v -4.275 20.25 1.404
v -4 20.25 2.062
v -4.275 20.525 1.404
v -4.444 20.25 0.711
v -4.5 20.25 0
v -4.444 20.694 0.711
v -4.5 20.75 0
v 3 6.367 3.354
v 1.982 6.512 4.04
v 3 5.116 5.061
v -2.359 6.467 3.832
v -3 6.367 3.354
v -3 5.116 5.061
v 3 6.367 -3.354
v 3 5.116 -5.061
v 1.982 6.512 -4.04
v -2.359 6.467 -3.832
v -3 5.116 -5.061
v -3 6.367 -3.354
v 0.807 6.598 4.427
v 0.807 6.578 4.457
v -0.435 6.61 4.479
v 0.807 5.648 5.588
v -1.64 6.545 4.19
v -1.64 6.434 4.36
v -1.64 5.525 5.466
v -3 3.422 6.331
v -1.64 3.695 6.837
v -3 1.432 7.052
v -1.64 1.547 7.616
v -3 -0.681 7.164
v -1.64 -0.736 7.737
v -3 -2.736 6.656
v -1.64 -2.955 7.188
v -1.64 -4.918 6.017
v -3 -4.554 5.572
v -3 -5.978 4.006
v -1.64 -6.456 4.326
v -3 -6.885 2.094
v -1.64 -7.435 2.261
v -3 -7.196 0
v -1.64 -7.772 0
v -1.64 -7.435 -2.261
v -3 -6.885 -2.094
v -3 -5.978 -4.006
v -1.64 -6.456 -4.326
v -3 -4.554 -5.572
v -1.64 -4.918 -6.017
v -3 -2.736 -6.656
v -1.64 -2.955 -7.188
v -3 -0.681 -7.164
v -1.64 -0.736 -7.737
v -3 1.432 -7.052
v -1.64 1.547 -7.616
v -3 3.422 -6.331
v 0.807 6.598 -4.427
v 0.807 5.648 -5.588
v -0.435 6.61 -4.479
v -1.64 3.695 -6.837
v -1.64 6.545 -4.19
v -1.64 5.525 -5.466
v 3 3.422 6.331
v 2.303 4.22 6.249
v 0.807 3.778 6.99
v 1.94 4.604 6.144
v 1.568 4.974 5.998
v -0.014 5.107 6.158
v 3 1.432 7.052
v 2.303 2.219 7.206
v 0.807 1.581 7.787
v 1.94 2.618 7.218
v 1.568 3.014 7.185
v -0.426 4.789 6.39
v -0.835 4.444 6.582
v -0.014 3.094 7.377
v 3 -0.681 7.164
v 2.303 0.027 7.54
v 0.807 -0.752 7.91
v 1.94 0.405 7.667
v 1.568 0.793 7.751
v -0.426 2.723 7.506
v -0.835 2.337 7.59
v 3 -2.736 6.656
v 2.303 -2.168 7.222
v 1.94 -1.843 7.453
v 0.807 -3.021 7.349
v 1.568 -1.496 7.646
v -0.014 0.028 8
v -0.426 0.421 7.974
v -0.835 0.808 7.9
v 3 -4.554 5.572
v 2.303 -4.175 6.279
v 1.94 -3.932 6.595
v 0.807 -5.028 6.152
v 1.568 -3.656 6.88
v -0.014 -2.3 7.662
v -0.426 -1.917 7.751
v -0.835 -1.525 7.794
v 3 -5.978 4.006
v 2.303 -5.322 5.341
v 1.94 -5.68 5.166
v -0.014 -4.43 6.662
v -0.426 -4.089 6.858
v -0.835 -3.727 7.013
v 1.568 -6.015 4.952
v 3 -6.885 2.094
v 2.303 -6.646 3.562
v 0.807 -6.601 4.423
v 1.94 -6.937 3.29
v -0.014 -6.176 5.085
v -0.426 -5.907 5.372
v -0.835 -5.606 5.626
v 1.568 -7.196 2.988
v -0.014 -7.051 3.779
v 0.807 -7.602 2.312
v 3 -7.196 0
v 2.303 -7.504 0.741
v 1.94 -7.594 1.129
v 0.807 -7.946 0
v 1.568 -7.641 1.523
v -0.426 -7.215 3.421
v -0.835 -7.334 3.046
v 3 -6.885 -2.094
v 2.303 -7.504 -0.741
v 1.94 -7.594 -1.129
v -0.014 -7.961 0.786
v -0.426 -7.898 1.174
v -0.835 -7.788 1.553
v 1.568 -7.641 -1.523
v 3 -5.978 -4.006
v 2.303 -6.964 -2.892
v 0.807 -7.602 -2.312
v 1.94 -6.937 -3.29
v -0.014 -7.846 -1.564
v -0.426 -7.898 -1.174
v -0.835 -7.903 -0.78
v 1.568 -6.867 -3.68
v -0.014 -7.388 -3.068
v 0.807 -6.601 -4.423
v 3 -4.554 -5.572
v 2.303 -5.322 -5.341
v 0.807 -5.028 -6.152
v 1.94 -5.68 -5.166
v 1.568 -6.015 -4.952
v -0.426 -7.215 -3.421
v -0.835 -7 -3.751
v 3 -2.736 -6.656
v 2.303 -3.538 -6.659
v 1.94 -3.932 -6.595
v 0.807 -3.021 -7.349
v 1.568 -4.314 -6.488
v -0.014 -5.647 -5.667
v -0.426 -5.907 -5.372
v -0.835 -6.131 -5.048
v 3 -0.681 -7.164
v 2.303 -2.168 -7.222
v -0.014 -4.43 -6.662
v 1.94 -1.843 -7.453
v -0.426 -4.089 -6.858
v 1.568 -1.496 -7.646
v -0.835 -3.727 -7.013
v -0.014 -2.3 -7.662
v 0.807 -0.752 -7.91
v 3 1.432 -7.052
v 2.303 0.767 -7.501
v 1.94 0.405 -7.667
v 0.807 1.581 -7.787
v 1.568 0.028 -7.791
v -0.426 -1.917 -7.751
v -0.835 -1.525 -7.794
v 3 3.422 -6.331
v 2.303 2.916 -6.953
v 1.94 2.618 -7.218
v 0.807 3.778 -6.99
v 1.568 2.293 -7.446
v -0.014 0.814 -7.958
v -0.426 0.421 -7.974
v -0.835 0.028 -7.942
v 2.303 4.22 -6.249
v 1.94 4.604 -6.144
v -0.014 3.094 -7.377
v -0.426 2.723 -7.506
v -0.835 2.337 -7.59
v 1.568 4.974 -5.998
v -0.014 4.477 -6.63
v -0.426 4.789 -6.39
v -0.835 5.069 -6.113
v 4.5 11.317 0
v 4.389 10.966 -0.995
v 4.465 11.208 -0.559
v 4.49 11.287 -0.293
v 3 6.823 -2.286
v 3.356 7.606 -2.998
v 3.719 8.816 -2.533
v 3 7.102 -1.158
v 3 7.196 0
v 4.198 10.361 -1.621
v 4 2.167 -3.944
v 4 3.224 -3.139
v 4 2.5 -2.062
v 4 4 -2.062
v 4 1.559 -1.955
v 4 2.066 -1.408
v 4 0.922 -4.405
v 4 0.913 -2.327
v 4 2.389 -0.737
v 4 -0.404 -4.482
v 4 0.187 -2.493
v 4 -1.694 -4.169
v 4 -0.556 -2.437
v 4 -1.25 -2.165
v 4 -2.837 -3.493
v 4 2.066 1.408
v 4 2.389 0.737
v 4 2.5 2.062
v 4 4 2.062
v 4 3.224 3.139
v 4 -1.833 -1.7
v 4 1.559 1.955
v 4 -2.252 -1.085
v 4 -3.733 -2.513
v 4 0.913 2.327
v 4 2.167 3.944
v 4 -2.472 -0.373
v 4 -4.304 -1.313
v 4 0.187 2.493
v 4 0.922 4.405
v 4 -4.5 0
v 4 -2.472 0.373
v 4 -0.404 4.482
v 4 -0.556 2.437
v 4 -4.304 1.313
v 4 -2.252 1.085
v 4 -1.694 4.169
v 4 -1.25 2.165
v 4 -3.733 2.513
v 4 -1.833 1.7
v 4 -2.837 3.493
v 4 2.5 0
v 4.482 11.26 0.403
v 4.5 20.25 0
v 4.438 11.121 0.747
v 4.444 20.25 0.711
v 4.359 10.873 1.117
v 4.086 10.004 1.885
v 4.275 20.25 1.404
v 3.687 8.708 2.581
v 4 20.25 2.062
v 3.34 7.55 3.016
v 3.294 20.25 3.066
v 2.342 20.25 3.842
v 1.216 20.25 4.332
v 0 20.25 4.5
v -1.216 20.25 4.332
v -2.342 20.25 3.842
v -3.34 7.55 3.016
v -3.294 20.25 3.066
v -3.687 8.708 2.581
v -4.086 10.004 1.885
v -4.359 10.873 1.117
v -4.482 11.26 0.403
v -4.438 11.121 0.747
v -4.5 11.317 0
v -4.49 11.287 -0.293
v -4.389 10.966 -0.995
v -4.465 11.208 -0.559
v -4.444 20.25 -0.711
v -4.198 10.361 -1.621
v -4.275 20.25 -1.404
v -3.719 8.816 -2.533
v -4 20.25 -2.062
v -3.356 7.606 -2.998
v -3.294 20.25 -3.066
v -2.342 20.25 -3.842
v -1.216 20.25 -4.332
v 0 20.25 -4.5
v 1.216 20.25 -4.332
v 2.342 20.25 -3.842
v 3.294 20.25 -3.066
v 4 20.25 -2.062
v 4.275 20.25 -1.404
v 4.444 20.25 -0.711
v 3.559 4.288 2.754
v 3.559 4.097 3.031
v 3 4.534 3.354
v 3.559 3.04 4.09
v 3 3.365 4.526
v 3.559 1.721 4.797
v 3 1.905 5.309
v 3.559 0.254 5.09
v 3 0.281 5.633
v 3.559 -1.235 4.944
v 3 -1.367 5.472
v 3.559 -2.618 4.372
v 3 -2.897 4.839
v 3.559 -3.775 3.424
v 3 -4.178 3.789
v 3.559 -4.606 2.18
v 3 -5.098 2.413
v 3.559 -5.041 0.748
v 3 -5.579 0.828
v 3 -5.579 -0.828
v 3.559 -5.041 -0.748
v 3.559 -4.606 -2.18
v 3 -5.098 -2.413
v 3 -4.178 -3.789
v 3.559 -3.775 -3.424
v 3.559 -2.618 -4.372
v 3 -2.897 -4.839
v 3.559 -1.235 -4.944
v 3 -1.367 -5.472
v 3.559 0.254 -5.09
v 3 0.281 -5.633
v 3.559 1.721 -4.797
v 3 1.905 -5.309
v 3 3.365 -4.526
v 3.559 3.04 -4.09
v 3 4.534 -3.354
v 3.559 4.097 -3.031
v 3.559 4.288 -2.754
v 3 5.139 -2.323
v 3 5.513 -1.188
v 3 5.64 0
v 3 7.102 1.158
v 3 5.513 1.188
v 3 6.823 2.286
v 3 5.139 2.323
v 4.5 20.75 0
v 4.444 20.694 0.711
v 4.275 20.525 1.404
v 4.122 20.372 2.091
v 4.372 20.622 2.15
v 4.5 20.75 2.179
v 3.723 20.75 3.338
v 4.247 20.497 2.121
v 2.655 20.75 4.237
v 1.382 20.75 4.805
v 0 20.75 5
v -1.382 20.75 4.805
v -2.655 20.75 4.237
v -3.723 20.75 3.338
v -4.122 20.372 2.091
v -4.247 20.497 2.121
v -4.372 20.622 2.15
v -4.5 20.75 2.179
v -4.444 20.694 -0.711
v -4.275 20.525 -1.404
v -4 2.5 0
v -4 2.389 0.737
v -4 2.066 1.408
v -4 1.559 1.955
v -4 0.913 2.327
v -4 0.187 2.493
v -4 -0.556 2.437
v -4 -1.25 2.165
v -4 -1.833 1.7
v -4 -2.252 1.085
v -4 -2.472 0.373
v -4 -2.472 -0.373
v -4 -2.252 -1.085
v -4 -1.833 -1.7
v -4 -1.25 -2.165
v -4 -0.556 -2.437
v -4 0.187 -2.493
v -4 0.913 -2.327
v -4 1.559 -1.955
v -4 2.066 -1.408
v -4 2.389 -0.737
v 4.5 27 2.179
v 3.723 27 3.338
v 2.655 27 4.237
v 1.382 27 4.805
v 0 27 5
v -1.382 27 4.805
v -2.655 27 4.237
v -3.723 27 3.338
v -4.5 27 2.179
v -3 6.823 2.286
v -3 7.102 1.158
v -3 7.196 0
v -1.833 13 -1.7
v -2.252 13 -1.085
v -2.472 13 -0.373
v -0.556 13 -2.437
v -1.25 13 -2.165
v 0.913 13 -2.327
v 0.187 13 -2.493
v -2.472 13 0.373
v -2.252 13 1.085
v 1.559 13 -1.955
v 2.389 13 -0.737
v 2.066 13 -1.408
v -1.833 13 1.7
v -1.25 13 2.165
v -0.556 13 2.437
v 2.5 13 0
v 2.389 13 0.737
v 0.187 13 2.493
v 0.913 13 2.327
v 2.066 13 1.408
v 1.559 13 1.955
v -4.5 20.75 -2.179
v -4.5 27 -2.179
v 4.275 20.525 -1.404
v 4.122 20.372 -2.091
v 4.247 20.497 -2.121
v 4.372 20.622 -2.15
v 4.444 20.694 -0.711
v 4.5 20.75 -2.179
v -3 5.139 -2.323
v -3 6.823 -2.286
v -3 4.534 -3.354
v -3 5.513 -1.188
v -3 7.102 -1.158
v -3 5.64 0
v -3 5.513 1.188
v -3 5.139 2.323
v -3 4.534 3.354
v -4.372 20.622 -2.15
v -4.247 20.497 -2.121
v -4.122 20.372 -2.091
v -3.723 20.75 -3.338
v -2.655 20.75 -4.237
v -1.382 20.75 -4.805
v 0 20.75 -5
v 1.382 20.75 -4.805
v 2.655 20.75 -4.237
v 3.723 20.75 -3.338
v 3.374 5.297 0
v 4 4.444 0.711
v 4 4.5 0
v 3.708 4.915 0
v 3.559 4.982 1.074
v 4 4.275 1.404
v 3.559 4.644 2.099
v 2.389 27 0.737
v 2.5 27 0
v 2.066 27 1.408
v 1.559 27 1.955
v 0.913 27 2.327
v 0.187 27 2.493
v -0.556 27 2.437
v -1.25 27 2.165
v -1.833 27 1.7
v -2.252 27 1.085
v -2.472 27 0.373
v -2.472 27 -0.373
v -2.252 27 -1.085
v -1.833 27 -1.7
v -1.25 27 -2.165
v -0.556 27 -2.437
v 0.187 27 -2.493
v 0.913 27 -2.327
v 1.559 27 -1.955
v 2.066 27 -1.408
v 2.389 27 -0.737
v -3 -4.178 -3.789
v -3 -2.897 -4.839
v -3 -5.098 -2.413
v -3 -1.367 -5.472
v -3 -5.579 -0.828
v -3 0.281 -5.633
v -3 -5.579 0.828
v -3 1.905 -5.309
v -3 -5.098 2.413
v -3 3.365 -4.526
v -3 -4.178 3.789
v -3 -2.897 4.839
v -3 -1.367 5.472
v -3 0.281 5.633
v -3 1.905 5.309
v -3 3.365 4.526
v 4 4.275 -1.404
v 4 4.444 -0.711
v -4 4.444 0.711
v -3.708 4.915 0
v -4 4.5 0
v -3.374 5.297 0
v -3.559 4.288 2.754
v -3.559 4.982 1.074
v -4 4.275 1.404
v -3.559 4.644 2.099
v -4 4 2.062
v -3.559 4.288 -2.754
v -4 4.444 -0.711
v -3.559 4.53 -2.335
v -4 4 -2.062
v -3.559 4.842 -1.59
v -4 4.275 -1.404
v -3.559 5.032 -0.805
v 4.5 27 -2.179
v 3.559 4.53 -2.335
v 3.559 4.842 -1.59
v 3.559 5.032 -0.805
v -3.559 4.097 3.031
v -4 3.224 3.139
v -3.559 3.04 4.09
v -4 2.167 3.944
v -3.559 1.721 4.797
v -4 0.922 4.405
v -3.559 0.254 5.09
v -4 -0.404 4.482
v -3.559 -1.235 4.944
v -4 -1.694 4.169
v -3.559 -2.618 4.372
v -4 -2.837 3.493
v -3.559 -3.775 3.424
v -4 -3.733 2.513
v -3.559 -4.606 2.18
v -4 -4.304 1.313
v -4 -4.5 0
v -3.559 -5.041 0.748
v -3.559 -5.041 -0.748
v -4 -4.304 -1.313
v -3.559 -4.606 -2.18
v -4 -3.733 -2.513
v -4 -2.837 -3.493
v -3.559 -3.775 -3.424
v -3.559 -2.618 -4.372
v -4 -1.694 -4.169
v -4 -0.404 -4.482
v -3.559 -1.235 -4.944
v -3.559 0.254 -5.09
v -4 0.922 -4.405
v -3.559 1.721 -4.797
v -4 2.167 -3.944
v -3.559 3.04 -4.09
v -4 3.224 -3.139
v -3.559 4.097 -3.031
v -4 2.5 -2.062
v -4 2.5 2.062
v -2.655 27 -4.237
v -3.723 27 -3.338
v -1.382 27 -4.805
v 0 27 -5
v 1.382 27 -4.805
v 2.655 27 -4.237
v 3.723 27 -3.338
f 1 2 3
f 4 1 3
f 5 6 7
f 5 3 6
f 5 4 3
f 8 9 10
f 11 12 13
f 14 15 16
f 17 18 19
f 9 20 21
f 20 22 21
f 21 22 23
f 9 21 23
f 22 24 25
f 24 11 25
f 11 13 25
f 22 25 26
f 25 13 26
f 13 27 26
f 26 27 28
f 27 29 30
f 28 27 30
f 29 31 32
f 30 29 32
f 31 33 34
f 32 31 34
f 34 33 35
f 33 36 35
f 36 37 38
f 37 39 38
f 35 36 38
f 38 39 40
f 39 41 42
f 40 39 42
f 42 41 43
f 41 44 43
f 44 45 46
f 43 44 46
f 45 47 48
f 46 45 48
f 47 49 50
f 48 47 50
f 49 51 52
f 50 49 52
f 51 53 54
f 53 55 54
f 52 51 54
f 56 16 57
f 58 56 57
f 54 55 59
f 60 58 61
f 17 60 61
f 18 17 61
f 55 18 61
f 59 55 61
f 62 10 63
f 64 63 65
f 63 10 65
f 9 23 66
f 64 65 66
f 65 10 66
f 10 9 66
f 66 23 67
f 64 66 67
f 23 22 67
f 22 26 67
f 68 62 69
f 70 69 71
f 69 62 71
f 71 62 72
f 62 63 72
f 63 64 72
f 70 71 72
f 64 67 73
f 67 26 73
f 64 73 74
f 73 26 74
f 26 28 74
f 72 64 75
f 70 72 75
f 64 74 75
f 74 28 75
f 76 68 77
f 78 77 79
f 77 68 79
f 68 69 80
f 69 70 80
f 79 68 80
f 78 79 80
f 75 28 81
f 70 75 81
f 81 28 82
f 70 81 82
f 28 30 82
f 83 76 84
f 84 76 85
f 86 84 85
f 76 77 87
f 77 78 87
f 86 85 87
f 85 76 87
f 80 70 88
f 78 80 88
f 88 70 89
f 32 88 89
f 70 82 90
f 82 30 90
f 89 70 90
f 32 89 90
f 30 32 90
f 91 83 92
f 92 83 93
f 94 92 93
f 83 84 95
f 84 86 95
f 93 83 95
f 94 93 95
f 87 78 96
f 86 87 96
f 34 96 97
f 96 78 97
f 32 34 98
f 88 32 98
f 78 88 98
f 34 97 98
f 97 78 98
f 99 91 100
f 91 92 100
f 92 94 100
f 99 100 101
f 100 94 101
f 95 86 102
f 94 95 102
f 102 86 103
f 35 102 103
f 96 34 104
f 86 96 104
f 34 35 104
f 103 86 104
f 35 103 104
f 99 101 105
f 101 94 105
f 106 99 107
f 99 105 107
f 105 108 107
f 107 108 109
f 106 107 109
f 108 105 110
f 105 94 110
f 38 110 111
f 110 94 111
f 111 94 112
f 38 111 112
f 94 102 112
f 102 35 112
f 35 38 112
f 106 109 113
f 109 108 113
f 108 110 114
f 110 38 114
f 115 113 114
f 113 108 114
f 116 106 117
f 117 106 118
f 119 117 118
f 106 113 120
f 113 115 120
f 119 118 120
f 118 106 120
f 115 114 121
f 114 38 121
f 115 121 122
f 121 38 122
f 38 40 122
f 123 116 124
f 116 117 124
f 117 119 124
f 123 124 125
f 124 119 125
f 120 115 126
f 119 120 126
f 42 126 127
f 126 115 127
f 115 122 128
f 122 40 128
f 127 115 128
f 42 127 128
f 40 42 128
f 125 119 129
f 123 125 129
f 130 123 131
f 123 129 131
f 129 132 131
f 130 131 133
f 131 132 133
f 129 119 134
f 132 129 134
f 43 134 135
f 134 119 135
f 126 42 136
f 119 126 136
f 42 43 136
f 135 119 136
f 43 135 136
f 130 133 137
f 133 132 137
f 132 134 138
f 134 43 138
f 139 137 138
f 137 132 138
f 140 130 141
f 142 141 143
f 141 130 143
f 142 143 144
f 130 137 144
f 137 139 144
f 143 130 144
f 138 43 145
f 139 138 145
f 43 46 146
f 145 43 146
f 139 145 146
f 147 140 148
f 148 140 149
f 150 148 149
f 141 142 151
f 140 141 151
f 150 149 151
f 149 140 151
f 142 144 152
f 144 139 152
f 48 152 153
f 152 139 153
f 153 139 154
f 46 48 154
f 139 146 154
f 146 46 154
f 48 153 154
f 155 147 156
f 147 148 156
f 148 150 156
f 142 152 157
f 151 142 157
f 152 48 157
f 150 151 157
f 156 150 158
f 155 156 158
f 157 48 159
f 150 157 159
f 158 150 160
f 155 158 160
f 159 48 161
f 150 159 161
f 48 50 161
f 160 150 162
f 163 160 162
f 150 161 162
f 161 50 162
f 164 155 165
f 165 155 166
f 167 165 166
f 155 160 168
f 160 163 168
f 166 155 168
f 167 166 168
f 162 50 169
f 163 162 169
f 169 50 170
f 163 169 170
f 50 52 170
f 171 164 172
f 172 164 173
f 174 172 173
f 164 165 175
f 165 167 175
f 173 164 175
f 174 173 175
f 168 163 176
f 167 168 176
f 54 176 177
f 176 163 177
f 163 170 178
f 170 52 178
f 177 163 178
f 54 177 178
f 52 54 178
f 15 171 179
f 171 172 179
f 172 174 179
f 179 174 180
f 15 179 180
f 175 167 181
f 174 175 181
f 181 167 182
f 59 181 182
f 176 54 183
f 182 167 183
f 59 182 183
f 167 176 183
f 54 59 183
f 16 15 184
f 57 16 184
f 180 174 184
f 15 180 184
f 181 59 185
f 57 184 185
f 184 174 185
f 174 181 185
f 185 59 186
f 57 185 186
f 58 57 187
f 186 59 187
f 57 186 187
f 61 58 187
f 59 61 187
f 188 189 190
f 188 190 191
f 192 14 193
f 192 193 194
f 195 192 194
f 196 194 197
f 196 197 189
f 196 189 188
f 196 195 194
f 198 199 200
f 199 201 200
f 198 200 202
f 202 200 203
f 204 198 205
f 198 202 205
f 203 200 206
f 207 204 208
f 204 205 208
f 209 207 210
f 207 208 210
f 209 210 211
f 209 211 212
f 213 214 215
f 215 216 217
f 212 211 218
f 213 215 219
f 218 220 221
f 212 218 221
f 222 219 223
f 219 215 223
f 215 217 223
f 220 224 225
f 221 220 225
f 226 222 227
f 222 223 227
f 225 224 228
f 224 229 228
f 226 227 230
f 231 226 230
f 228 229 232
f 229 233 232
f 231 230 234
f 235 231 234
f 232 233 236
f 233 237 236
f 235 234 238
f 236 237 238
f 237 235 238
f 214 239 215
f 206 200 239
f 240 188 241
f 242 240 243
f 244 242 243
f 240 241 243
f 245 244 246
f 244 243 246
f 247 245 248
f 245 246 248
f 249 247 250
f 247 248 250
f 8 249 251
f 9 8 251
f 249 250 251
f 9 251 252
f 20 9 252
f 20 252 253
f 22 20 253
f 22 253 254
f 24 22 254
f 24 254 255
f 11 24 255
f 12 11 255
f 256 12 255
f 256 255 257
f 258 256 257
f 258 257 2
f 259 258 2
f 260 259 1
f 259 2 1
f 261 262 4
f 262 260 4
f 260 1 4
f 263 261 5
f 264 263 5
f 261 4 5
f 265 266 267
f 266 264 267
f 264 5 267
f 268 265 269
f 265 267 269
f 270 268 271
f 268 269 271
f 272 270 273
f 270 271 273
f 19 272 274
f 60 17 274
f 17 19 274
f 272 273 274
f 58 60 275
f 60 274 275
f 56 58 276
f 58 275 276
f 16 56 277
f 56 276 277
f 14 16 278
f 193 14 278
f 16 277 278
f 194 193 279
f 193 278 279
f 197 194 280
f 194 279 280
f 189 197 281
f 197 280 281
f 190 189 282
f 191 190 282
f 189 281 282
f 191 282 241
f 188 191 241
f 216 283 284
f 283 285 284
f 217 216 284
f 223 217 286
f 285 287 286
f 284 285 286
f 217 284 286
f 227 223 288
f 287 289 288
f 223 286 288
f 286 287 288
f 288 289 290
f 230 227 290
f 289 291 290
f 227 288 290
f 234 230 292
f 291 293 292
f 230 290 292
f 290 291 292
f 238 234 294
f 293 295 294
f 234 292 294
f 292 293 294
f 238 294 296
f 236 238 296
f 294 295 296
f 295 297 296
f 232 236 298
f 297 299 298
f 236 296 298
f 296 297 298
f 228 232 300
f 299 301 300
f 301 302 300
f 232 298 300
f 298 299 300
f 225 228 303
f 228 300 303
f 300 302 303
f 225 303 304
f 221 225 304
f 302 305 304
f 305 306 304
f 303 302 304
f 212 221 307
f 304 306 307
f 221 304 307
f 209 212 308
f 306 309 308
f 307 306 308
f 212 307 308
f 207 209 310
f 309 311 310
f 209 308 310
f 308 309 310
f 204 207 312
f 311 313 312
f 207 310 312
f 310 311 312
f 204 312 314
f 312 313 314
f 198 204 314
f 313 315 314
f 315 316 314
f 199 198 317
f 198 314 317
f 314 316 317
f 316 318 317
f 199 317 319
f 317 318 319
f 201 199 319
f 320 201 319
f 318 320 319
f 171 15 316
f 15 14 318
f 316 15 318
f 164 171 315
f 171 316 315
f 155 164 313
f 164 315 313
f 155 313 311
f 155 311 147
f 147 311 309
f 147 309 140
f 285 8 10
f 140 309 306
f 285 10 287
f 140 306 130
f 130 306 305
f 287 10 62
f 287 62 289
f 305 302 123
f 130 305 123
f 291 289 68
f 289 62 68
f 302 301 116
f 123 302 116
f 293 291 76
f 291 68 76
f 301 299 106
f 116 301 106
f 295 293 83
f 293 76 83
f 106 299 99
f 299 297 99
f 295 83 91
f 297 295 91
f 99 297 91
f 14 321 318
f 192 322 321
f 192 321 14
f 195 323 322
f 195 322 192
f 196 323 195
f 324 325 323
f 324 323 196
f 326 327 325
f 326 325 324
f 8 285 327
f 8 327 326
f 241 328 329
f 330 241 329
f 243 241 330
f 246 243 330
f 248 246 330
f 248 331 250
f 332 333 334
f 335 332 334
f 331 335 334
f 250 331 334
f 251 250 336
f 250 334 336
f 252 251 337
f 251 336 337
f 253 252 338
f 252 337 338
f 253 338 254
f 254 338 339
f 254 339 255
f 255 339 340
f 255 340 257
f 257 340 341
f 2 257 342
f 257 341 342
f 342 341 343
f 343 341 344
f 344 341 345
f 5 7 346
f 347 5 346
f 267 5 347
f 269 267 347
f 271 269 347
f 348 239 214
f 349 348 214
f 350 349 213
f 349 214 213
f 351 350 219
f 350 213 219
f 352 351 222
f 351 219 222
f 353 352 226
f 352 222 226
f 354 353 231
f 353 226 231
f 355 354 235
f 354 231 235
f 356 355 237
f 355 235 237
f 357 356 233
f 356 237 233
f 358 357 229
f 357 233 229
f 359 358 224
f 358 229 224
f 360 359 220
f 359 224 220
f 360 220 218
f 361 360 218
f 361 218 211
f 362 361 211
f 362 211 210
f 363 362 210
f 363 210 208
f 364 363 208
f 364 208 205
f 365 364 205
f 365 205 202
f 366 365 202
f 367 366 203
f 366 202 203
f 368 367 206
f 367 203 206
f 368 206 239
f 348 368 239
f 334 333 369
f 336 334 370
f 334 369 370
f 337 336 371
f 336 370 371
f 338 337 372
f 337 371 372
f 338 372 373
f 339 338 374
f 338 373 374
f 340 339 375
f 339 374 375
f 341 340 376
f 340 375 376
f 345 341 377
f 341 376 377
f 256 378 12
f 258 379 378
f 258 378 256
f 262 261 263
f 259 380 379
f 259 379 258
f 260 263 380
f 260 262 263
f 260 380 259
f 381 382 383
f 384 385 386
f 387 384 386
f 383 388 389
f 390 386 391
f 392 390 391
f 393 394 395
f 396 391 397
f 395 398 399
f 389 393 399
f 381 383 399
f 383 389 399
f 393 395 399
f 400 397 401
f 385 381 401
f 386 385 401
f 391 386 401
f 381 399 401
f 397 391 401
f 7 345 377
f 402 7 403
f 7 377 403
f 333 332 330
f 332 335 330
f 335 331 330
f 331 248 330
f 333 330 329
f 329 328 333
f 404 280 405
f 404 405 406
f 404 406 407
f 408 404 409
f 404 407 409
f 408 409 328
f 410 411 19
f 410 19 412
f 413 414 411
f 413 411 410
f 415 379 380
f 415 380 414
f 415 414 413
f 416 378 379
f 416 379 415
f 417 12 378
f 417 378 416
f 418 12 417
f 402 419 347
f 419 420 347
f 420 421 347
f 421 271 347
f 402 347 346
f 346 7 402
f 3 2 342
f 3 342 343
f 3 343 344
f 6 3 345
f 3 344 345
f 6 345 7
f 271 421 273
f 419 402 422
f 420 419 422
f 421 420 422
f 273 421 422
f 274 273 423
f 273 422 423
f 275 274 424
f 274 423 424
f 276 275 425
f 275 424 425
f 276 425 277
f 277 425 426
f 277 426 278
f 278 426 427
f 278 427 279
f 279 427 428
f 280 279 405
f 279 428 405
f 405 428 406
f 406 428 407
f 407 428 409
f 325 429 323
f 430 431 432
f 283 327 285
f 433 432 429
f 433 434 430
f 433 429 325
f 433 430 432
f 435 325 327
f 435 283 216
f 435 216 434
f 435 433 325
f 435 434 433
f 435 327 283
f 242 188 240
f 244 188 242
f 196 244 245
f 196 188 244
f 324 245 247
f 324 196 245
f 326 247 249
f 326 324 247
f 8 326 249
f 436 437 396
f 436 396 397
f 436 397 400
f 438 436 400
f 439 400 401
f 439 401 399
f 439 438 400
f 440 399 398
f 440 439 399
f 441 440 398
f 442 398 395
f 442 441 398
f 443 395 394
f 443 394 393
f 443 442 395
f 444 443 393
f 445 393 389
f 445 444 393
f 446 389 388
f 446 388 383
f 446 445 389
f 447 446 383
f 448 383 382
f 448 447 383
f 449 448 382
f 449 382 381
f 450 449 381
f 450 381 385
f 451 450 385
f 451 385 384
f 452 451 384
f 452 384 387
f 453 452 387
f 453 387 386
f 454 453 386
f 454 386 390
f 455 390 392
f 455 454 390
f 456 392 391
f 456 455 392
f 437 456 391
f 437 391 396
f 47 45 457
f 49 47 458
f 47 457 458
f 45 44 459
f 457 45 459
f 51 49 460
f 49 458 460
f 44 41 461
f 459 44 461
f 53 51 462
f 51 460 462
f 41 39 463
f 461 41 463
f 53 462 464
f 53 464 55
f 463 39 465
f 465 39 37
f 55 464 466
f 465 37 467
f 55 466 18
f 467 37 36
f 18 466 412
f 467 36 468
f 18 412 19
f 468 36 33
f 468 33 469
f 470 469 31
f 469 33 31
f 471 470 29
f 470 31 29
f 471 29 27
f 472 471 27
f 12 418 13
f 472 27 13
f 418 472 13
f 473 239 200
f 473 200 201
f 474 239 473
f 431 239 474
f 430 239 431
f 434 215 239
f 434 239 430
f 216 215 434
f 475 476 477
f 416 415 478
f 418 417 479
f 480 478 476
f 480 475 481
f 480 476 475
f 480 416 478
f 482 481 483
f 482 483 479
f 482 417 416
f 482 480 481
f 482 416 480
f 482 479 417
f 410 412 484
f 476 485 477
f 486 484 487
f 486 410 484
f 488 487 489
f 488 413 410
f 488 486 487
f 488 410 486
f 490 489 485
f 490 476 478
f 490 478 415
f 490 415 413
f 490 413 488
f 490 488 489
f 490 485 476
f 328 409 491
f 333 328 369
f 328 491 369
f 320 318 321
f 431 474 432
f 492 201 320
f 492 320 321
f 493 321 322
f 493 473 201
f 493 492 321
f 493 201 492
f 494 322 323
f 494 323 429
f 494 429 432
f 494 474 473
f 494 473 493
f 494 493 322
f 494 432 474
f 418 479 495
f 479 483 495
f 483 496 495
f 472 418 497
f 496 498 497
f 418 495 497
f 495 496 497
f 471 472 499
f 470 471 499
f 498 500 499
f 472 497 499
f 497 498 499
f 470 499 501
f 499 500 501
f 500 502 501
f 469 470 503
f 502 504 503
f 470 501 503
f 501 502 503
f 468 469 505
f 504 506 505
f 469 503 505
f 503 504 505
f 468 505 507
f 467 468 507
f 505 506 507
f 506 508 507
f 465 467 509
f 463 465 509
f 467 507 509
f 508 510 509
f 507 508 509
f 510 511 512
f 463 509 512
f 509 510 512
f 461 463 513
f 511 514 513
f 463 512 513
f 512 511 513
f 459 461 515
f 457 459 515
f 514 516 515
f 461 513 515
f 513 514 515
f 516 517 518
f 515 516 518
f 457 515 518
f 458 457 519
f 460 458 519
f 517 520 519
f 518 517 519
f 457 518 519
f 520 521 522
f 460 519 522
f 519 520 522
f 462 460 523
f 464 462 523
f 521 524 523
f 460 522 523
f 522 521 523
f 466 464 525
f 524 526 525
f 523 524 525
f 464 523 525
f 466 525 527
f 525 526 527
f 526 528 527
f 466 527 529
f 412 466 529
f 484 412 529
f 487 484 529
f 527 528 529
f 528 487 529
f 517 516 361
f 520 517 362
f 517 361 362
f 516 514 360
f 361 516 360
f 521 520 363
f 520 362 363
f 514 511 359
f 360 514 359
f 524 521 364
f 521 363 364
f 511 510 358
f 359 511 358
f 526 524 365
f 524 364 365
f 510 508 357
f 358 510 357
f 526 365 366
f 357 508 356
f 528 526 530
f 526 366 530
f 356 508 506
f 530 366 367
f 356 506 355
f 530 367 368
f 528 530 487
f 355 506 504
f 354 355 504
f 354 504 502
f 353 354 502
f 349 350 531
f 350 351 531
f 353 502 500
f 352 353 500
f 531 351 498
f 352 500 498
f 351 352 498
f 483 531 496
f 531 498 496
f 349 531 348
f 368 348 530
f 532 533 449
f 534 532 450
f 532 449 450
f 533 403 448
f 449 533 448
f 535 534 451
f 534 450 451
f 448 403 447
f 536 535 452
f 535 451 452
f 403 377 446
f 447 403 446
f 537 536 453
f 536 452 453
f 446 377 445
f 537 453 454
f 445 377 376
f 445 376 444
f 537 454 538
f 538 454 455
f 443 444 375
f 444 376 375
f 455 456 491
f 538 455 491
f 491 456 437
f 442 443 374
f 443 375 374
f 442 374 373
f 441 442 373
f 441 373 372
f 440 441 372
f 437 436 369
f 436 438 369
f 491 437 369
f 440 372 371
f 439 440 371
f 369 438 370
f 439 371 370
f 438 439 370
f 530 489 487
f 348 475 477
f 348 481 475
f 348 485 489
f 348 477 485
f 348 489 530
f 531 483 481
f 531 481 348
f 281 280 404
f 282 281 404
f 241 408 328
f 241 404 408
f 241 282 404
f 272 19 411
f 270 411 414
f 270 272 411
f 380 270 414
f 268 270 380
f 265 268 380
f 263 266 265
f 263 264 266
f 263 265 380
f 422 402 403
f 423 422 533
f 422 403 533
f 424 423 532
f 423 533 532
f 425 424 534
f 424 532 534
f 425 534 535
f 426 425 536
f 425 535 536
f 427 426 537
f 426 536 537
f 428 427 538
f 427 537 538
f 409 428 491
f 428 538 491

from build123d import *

# Parameters (mm, degrees)
F9_R          = 2.5
F10_DEPTH     = 24.5
F11_DEPTH     = 6.75
F12_DEPTH     = 14
F13_T2_ANGLE  = 157.8095212227
F13_T6_DEPTH  = 3.4652909658
F13_S7_R      = 4.5
F13_T8_DEPTH  = 3
F13_T12_DEPTH = 3.4652909658
F13_S13_R     = 4.5
F13_T14_DEPTH = 3
F13_T16_ANGLE = 157.8095212227
F13_T20_DEPTH = 3.4652909658
F13_S21_R     = 4.5
F13_T22_DEPTH = 3
F13_T26_DEPTH = 3.4652909658
F13_S27_R     = 4.5
F13_T28_DEPTH = 3


# Not quite as in the source:
# - a fillet or chamfer that OpenCascade refuses, or shapes differently, is made with other operations: its cross-section is extruded or revolved along the edge and cut away or added


with BuildPart() as f7:
    # F6 (on Top) → F7 (revolve)
    with BuildSketch(Plane.XY):
        with BuildLine():
            Line((-4, 4.5), (-4, 2.5))
            Line((-4, 2.5), (4, 2.5))
            Line((4, 2.5), (4, 4.5))
            ThreePointArc((4, 4.5), (3.5461149614, 5.1104772433), (3, 5.6400549446))
            ThreePointArc((3, 5.6400549446), (0, 6.716990566), (-3, 5.6400549446))
            ThreePointArc((-3, 5.6400549446), (-3.5461149614, 5.1104772433), (-4, 4.5))
        make_face()
        with BuildLine():
            Line((-3, 7.1961524227), (-3, 5.6400549446))
            ThreePointArc((-3, 5.6400549446), (0, 6.716990566), (3, 5.6400549446))
            Line((3, 5.6400549446), (3, 7.1961524227))
            ThreePointArc((3, 7.1961524227), (0, 8), (-3, 7.1961524227))
        make_face()
    revolve(axis=Axis((0, 0, 0), (1, 0, 0)))

    # F9 (on offset) → F10 (join)
    with BuildSketch(Plane.XZ.offset(-27)):
        with BuildLine():
            ThreePointArc((-4.5, 0), (0, -4.5), (4.5, 0))
            ThreePointArc((4.5, 0), (0, 4.5), (-4.5, 0))
        make_face()
        Circle(F9_R, mode=Mode.SUBTRACT)
        Circle(F9_R)
    extrude(amount=F10_DEPTH)

    # F9 (on offset) → F11 (join)
    with BuildSketch(Plane.XZ.offset(-27)):
        with BuildLine():
            ThreePointArc((-4.5, 0), (0, 4.5), (4.5, 0))
            Line((4.5, 0), (4.5, 2.1794494718))
            ThreePointArc((4.5, 2.1794494718), (0, 5), (-4.5, 2.1794494718))
            Line((-4.5, 2.1794494718), (-4.5, 0))
        make_face()
        with BuildLine():
            Line((4.5, -2.1794494718), (4.5, 0))
            ThreePointArc((4.5, 0), (0, -4.5), (-4.5, 0))
            Line((-4.5, 0), (-4.5, -2.1794494718))
            ThreePointArc((-4.5, -2.1794494718), (0, -5), (4.5, -2.1794494718))
        make_face()
    extrude(amount=F11_DEPTH)

    # F9 (on offset) → F12 (cut)
    with BuildSketch(Plane.XZ.offset(-27)):
        Circle(F9_R)
    extrude(amount=F12_DEPTH, mode=Mode.SUBTRACT)

    # F13: chamfer of 0.5 on 6 edges, made by hand

    # F13_s1 → F13_t2 (revolve, cut)
    with BuildSketch(Plane(origin=(0, 0, 0), x_dir=(0, 1, 0), z_dir=(0.1924404319, 0, -0.9813086569))):
        Polygon((20.25, 4.5), (20.75, 5), (20.25, 5), align=None)
    revolve(axis=Axis((0, 20.25, 0), (0, -1, 0)), revolution_arc=F13_T2_ANGLE, mode=Mode.SUBTRACT)


with BuildPart() as f13_tool4:
    # F13_s5 → F13_t6 (new body)
    with BuildSketch(Plane.XY):
        Polygon((4, 20.25), (4.5, 20.75), (4.5, 20.25), align=None)
    extrude(amount=F13_T6_DEPTH)

    # F13_s7 → F13_t8 (cut, symmetric)
    with BuildSketch(Plane.XZ.offset(-20.5)):
        Circle(F13_S7_R)
    extrude(amount=F13_T8_DEPTH, both=True, mode=Mode.SUBTRACT)


with BuildPart() as f7_1:
    add(f7.part)

    # F13_t3: cut F13_tool4
    add(f13_tool4.part, mode=Mode.SUBTRACT)


with BuildPart() as f13_tool10:
    # F13_s11 → F13_t12 (new body)
    with BuildSketch(Plane.XY.offset(3.4652909658)):
        Polygon((-4, 20.25), (-4.5, 20.75), (-4.5, 20.25), align=None)
    extrude(amount=-F13_T12_DEPTH)

    # F13_s13 → F13_t14 (cut, symmetric)
    with BuildSketch(Plane.XZ.offset(-20.5)):
        Circle(F13_S13_R)
    extrude(amount=F13_T14_DEPTH, both=True, mode=Mode.SUBTRACT)


with BuildPart() as f7_2:
    add(f7_1.part)

    # F13_t9: cut F13_tool10
    add(f13_tool10.part, mode=Mode.SUBTRACT)

    # F13_s15 → F13_t16 (revolve, cut)
    with BuildSketch(Plane(origin=(0, 0, 0), x_dir=(0, 1, 0), z_dir=(-0.1924404319, 0, 0.9813086569))):
        Polygon((20.25, 4.5), (20.75, 5), (20.25, 5), align=None)
    revolve(axis=Axis((0, 20.25, 0), (0, -1, 0)), revolution_arc=F13_T16_ANGLE, mode=Mode.SUBTRACT)


with BuildPart() as f13_tool18:
    # F13_s19 → F13_t20 (new body)
    with BuildSketch(Plane.XY.offset(-3.4652909658)):
        Polygon((4, 20.25), (4.5, 20.75), (4.5, 20.25), align=None)
    extrude(amount=F13_T20_DEPTH)

    # F13_s21 → F13_t22 (cut, symmetric)
    with BuildSketch(Plane.XZ.offset(-20.5)):
        Circle(F13_S21_R)
    extrude(amount=F13_T22_DEPTH, both=True, mode=Mode.SUBTRACT)


with BuildPart() as f7_3:
    add(f7_2.part)

    # F13_t17: cut F13_tool18
    add(f13_tool18.part, mode=Mode.SUBTRACT)


with BuildPart() as f13_tool24:
    # F13_s25 → F13_t26 (new body)
    with BuildSketch(Plane.XY):
        Polygon((-4, 20.25), (-4.5, 20.75), (-4.5, 20.25), align=None)
    extrude(amount=-F13_T26_DEPTH)

    # F13_s27 → F13_t28 (cut, symmetric)
    with BuildSketch(Plane.XZ.offset(-20.5)):
        Circle(F13_S27_R)
    extrude(amount=F13_T28_DEPTH, both=True, mode=Mode.SUBTRACT)


with BuildPart() as f7_4:
    add(f7_3.part)

    # F13_t23: cut F13_tool24
    add(f13_tool24.part, mode=Mode.SUBTRACT)

    # F6 (on Top) → F14 (revolve, cut)
    with BuildSketch(Plane.XY):
        with BuildLine():
            Line((4, 4.5), (4, 2.5))
            Line((4, 2.5), (6, 2.5))
            Line((6, 2.5), (6, 15.4385846811))
            Line((6, 15.4385846811), (3, 7.1961524227))
            Line((3, 7.1961524227), (3, 5.6400549446))
            ThreePointArc((3, 5.6400549446), (3.5461149614, 5.1104772433), (4, 4.5))
        make_face()
        with BuildLine():
            Line((-6, 2.5), (-4, 2.5))
            Line((-4, 2.5), (-4, 4.5))
            ThreePointArc((-4, 4.5), (-3.5461149614, 5.1104772433), (-3, 5.6400549446))
            Line((-3, 5.6400549446), (-3, 7.1961524227))
            Line((-3, 7.1961524227), (-6, 15.4385846811))
            Line((-6, 15.4385846811), (-6, 2.5))
        make_face()
    revolve(axis=Axis((0, 0, 0), (1, 0, 0)), mode=Mode.SUBTRACT)


solid = f7_4.part
